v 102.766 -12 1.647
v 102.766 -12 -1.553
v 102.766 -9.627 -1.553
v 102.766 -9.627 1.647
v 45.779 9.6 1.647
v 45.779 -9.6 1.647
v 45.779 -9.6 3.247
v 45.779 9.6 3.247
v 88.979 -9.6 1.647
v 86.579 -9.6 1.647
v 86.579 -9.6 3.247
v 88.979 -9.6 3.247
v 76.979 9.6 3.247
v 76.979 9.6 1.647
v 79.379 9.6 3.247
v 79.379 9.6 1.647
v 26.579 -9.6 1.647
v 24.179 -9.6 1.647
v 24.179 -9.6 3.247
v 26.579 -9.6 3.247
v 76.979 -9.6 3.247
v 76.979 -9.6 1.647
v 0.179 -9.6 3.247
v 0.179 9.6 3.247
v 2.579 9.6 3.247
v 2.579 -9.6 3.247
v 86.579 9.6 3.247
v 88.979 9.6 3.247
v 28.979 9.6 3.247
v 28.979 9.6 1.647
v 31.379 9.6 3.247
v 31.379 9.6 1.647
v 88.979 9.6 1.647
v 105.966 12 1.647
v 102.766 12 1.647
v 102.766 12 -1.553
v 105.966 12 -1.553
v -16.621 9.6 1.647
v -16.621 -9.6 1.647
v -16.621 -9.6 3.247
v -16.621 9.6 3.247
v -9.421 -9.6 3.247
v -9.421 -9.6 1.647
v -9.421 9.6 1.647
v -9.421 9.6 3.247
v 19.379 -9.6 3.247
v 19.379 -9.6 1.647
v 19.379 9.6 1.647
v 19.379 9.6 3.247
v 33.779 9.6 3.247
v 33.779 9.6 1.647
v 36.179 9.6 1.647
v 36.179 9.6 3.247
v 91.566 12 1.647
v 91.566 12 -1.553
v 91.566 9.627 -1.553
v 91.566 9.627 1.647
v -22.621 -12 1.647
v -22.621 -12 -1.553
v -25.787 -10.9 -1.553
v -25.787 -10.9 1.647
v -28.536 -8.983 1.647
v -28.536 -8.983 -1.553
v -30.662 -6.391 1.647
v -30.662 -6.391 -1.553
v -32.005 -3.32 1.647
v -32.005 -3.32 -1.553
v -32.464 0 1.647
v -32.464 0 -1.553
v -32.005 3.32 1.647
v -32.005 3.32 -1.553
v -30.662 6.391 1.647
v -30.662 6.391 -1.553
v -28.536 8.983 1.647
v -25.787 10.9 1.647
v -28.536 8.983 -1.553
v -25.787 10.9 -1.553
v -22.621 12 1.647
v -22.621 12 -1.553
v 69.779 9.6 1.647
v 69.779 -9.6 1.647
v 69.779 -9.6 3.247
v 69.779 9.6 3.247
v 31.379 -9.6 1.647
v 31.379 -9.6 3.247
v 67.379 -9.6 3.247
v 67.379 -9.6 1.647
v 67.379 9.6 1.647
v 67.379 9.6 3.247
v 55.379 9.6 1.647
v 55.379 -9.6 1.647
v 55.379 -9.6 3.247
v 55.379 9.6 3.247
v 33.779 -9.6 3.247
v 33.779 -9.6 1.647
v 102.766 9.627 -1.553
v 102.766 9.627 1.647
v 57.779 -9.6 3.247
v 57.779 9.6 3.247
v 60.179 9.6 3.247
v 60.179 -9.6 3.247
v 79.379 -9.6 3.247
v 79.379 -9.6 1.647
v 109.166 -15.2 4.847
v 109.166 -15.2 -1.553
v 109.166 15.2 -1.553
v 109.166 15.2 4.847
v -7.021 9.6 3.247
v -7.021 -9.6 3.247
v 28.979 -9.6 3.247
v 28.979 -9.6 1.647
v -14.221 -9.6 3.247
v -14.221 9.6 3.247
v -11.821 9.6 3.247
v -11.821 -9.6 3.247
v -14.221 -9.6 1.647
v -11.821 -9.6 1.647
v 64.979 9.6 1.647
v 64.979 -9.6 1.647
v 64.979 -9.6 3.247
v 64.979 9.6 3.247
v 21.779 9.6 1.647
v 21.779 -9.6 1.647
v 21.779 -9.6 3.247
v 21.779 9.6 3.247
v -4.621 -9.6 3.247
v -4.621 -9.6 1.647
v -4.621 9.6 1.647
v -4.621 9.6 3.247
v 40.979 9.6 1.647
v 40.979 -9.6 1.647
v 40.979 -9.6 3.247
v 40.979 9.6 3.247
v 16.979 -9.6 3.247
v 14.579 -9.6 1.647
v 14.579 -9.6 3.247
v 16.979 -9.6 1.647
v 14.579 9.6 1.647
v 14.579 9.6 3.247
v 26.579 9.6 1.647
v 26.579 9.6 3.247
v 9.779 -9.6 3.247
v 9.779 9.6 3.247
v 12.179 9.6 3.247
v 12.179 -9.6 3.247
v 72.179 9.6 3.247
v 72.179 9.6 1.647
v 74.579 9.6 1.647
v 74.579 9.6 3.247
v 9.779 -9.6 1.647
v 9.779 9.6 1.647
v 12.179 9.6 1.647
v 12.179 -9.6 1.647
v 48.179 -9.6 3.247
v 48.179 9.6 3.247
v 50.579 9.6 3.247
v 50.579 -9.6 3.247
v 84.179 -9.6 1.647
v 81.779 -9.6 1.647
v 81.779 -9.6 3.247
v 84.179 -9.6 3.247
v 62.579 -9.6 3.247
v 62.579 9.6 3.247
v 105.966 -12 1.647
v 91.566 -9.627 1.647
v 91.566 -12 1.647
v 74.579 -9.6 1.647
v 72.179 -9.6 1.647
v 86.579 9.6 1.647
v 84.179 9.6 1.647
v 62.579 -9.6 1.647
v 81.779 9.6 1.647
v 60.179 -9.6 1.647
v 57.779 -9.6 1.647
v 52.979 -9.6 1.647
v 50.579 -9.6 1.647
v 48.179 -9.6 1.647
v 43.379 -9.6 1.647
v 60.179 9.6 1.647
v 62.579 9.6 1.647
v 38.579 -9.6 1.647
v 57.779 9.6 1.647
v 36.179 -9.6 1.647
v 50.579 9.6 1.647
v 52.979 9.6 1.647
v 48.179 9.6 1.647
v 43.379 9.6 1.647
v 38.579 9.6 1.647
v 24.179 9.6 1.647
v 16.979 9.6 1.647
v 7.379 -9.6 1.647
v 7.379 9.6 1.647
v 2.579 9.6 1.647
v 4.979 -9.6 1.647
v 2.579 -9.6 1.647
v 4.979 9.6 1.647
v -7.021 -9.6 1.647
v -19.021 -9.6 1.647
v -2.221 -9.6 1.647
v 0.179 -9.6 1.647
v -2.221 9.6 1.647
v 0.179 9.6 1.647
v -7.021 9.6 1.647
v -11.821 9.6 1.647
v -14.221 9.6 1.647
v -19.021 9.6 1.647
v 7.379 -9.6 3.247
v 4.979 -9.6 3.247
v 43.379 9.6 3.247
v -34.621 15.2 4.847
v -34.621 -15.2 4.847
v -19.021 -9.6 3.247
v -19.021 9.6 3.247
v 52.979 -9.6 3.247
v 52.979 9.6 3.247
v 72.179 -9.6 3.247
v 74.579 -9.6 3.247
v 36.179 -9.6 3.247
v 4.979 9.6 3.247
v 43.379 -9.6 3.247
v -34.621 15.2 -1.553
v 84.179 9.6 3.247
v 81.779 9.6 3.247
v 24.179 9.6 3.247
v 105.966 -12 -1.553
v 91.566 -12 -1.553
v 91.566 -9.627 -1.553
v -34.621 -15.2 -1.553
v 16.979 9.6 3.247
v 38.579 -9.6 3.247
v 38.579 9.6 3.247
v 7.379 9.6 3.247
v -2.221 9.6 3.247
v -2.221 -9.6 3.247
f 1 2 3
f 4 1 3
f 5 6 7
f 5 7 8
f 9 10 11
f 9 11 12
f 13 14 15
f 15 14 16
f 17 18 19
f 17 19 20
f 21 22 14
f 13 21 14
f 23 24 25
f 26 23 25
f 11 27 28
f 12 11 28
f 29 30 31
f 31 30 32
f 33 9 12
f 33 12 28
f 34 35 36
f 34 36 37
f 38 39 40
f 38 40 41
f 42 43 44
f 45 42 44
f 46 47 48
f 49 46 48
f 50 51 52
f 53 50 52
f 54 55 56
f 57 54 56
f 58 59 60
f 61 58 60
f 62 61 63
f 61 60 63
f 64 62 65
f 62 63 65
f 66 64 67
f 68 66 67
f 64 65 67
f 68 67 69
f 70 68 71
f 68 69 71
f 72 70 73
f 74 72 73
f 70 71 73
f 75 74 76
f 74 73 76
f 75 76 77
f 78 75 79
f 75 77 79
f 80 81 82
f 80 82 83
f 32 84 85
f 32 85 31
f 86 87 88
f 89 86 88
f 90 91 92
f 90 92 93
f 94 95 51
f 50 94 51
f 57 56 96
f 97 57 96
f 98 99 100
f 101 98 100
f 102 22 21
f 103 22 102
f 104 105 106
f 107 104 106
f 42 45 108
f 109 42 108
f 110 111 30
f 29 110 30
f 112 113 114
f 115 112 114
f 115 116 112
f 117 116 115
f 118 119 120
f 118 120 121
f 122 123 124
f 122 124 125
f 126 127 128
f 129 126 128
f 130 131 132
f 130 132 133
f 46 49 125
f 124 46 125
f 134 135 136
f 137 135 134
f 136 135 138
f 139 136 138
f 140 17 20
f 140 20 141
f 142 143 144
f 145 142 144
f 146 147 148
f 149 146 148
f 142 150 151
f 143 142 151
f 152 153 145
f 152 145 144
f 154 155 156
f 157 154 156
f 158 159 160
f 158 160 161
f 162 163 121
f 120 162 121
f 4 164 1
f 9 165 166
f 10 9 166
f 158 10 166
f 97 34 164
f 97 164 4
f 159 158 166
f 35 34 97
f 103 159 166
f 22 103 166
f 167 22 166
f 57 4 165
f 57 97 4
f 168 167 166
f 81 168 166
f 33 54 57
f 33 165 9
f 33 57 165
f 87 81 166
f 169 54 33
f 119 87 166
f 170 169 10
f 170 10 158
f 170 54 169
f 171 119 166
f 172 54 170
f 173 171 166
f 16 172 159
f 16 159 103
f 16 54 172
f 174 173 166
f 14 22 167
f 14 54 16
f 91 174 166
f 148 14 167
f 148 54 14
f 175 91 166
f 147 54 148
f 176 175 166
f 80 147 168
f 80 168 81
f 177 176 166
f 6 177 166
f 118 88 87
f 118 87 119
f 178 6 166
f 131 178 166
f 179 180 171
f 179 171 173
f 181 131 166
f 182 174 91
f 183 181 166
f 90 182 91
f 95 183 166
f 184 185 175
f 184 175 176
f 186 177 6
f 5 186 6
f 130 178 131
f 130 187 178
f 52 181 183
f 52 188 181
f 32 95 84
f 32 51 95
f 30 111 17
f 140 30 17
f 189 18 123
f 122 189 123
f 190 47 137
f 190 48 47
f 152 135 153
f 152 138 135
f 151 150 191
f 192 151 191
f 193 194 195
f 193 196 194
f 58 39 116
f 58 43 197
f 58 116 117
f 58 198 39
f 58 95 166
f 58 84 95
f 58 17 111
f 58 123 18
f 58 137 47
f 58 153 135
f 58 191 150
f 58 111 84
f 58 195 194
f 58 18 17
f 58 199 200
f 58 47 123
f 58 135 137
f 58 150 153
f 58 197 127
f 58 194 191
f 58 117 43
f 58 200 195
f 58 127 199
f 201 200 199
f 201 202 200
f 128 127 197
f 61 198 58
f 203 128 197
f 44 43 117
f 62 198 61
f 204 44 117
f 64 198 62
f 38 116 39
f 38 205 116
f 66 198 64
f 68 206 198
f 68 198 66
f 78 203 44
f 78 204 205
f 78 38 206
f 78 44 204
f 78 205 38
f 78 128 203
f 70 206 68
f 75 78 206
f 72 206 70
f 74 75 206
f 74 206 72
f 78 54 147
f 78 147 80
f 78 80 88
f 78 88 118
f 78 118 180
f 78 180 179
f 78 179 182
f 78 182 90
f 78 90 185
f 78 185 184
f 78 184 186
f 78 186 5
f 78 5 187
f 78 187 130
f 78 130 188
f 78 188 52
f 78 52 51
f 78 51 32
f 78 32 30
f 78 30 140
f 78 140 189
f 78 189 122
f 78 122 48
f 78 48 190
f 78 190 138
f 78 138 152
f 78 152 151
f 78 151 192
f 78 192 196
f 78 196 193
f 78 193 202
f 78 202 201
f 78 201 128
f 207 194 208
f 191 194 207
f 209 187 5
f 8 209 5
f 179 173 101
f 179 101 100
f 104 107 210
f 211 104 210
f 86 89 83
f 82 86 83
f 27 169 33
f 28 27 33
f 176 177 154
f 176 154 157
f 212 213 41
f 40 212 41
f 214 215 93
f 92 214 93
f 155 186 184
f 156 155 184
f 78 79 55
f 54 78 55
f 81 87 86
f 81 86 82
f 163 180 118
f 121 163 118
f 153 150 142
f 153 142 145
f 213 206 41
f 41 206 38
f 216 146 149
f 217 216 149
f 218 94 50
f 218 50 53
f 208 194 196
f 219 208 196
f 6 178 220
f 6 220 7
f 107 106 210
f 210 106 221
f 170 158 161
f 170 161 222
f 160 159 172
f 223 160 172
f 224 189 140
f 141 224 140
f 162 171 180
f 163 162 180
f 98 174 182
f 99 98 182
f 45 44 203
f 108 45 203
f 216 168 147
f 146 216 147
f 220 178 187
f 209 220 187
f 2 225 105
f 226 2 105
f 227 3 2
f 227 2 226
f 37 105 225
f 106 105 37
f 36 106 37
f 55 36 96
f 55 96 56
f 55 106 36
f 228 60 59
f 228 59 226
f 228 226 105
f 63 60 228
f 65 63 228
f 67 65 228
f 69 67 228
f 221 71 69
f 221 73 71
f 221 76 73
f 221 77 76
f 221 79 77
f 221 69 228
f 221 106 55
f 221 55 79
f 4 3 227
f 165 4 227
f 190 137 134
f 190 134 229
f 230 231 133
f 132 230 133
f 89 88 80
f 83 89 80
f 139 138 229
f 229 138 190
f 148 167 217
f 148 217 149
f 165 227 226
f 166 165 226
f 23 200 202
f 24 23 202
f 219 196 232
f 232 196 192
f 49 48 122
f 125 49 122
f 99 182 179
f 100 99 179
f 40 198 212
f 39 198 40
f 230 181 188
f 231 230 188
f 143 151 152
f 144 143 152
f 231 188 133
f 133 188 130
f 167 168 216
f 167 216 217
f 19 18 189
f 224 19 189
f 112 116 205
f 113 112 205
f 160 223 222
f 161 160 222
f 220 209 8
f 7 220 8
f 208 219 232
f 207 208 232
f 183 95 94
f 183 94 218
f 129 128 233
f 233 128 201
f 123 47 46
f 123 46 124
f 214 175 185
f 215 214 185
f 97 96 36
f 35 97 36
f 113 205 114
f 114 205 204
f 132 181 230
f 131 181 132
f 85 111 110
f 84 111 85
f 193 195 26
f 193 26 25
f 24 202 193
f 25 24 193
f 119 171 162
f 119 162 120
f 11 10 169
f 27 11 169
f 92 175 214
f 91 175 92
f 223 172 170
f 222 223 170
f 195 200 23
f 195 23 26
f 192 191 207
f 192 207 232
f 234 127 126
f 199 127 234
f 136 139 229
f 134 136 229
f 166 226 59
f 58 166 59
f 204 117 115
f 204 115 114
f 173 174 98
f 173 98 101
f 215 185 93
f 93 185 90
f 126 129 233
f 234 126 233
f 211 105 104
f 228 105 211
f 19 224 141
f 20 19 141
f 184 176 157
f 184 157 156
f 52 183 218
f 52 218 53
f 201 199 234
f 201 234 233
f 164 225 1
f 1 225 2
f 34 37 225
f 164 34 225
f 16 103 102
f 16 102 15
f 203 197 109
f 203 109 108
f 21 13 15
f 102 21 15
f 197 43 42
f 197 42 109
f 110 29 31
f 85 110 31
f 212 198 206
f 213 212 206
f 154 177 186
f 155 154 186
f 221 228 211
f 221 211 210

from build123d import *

# Parameters (mm, degrees)
EXTRUDE_1_DEPTH = 2
SKETCH_2_W      = 1.5
SKETCH_2_H      = 12
EXTRUDE_2_DEPTH = 1
SKETCH_3_W      = 89.86690944
SKETCH_3_H      = 19
EXTRUDE_3_DEPTH = 4
SCALE_1_SCALE   = 1.6


with BuildPart() as part:
    # 草图1 → 凸台-拉伸1 (new body)
    with BuildSketch(Plane.XY):
        with BuildLine():
            Line((0, 7.5), (71.36690944, 7.5))
            Line((71.36690944, 7.5), (71.36690944, 6.01680195))
            Line((71.36690944, 6.01680195), (78.36690944, 6.01680195))
            Line((78.36690944, 6.01680195), (78.36690944, 7.5))
            Line((78.36690944, 7.5), (80.36690944, 7.5))
            Line((80.36690944, 7.5), (80.36690944, -7.5))
            Line((80.36690944, -7.5), (78.36690944, -7.5))
            Line((78.36690944, -7.5), (78.36690944, -6.01680195))
            Line((78.36690944, -6.01680195), (71.36690944, -6.01680195))
            Line((71.36690944, -6.01680195), (71.36690944, -7.5))
            Line((71.36690944, -7.5), (0, -7.5))
            ThreePointArc((0, -7.5), (-6.151670717, 0), (0, 7.5))
        make_face()
    extrude(amount=EXTRUDE_1_DEPTH)

    # 草图2 → 凸台-拉伸2 (add)
    with BuildSketch(Plane.XY.offset(2)):
        with Locations((3, 0)):
            Rectangle(SKETCH_2_W, SKETCH_2_H)
        with Locations((6, 0)):
            Rectangle(SKETCH_2_W, SKETCH_2_H)
        with Locations((9, 0)):
            Rectangle(SKETCH_2_W, SKETCH_2_H)
        with Locations((12, 0)):
            Rectangle(SKETCH_2_W, SKETCH_2_H)
        with Locations((15, 0)):
            Rectangle(SKETCH_2_W, SKETCH_2_H)
        with Locations((18, 0)):
            Rectangle(SKETCH_2_W, SKETCH_2_H)
        with Locations((21, 0)):
            Rectangle(SKETCH_2_W, SKETCH_2_H)
        with Locations((24, 0)):
            Rectangle(SKETCH_2_W, SKETCH_2_H)
        with Locations((27, 0)):
            Rectangle(SKETCH_2_W, SKETCH_2_H)
        with Locations((30, 0)):
            Rectangle(SKETCH_2_W, SKETCH_2_H)
        with Locations((33, 0)):
            Rectangle(SKETCH_2_W, SKETCH_2_H)
        with Locations((36, 0)):
            Rectangle(SKETCH_2_W, SKETCH_2_H)
        with Locations((39, 0)):
            Rectangle(SKETCH_2_W, SKETCH_2_H)
        with Locations((42, 0)):
            Rectangle(SKETCH_2_W, SKETCH_2_H)
        with Locations((45, 0)):
            Rectangle(SKETCH_2_W, SKETCH_2_H)
        with Locations((48, 0)):
            Rectangle(SKETCH_2_W, SKETCH_2_H)
        with Locations((51, 0)):
            Rectangle(SKETCH_2_W, SKETCH_2_H)
        with Locations((54, 0)):
            Rectangle(SKETCH_2_W, SKETCH_2_H)
        with Locations((57, 0)):
            Rectangle(SKETCH_2_W, SKETCH_2_H)
        with Locations((60, 0)):
            Rectangle(SKETCH_2_W, SKETCH_2_H)
        with Locations((63, 0)):
            Rectangle(SKETCH_2_W, SKETCH_2_H)
        with Locations((66, 0)):
            Rectangle(SKETCH_2_W, SKETCH_2_H)
        with Locations((69, 0)):
            Rectangle(SKETCH_2_W, SKETCH_2_H)
    extrude(amount=EXTRUDE_2_DEPTH)


with BuildPart() as body_2:
    # 草图3 → 凸台-拉伸3 (new body)
    with BuildSketch(Plane(origin=(0, 0, 0), x_dir=(-1, 0, 0), z_dir=(0, 0, -1))):
        with Locations((-37.43345472, 0)):
            Rectangle(SKETCH_3_W, SKETCH_3_H)
    extrude(amount=-EXTRUDE_3_DEPTH)

    # Combine 1: cut part
    add(part.part, mode=Mode.SUBTRACT)


with BuildPart() as body_2_1:
    # 缩放比例1: scaled about (37.701981545, 0, 2.588708168)
    add(body_2.part.scale(SCALE_1_SCALE).moved(Location((-22.621188927, 0, -1.553224901))))


solid = body_2_1.part
